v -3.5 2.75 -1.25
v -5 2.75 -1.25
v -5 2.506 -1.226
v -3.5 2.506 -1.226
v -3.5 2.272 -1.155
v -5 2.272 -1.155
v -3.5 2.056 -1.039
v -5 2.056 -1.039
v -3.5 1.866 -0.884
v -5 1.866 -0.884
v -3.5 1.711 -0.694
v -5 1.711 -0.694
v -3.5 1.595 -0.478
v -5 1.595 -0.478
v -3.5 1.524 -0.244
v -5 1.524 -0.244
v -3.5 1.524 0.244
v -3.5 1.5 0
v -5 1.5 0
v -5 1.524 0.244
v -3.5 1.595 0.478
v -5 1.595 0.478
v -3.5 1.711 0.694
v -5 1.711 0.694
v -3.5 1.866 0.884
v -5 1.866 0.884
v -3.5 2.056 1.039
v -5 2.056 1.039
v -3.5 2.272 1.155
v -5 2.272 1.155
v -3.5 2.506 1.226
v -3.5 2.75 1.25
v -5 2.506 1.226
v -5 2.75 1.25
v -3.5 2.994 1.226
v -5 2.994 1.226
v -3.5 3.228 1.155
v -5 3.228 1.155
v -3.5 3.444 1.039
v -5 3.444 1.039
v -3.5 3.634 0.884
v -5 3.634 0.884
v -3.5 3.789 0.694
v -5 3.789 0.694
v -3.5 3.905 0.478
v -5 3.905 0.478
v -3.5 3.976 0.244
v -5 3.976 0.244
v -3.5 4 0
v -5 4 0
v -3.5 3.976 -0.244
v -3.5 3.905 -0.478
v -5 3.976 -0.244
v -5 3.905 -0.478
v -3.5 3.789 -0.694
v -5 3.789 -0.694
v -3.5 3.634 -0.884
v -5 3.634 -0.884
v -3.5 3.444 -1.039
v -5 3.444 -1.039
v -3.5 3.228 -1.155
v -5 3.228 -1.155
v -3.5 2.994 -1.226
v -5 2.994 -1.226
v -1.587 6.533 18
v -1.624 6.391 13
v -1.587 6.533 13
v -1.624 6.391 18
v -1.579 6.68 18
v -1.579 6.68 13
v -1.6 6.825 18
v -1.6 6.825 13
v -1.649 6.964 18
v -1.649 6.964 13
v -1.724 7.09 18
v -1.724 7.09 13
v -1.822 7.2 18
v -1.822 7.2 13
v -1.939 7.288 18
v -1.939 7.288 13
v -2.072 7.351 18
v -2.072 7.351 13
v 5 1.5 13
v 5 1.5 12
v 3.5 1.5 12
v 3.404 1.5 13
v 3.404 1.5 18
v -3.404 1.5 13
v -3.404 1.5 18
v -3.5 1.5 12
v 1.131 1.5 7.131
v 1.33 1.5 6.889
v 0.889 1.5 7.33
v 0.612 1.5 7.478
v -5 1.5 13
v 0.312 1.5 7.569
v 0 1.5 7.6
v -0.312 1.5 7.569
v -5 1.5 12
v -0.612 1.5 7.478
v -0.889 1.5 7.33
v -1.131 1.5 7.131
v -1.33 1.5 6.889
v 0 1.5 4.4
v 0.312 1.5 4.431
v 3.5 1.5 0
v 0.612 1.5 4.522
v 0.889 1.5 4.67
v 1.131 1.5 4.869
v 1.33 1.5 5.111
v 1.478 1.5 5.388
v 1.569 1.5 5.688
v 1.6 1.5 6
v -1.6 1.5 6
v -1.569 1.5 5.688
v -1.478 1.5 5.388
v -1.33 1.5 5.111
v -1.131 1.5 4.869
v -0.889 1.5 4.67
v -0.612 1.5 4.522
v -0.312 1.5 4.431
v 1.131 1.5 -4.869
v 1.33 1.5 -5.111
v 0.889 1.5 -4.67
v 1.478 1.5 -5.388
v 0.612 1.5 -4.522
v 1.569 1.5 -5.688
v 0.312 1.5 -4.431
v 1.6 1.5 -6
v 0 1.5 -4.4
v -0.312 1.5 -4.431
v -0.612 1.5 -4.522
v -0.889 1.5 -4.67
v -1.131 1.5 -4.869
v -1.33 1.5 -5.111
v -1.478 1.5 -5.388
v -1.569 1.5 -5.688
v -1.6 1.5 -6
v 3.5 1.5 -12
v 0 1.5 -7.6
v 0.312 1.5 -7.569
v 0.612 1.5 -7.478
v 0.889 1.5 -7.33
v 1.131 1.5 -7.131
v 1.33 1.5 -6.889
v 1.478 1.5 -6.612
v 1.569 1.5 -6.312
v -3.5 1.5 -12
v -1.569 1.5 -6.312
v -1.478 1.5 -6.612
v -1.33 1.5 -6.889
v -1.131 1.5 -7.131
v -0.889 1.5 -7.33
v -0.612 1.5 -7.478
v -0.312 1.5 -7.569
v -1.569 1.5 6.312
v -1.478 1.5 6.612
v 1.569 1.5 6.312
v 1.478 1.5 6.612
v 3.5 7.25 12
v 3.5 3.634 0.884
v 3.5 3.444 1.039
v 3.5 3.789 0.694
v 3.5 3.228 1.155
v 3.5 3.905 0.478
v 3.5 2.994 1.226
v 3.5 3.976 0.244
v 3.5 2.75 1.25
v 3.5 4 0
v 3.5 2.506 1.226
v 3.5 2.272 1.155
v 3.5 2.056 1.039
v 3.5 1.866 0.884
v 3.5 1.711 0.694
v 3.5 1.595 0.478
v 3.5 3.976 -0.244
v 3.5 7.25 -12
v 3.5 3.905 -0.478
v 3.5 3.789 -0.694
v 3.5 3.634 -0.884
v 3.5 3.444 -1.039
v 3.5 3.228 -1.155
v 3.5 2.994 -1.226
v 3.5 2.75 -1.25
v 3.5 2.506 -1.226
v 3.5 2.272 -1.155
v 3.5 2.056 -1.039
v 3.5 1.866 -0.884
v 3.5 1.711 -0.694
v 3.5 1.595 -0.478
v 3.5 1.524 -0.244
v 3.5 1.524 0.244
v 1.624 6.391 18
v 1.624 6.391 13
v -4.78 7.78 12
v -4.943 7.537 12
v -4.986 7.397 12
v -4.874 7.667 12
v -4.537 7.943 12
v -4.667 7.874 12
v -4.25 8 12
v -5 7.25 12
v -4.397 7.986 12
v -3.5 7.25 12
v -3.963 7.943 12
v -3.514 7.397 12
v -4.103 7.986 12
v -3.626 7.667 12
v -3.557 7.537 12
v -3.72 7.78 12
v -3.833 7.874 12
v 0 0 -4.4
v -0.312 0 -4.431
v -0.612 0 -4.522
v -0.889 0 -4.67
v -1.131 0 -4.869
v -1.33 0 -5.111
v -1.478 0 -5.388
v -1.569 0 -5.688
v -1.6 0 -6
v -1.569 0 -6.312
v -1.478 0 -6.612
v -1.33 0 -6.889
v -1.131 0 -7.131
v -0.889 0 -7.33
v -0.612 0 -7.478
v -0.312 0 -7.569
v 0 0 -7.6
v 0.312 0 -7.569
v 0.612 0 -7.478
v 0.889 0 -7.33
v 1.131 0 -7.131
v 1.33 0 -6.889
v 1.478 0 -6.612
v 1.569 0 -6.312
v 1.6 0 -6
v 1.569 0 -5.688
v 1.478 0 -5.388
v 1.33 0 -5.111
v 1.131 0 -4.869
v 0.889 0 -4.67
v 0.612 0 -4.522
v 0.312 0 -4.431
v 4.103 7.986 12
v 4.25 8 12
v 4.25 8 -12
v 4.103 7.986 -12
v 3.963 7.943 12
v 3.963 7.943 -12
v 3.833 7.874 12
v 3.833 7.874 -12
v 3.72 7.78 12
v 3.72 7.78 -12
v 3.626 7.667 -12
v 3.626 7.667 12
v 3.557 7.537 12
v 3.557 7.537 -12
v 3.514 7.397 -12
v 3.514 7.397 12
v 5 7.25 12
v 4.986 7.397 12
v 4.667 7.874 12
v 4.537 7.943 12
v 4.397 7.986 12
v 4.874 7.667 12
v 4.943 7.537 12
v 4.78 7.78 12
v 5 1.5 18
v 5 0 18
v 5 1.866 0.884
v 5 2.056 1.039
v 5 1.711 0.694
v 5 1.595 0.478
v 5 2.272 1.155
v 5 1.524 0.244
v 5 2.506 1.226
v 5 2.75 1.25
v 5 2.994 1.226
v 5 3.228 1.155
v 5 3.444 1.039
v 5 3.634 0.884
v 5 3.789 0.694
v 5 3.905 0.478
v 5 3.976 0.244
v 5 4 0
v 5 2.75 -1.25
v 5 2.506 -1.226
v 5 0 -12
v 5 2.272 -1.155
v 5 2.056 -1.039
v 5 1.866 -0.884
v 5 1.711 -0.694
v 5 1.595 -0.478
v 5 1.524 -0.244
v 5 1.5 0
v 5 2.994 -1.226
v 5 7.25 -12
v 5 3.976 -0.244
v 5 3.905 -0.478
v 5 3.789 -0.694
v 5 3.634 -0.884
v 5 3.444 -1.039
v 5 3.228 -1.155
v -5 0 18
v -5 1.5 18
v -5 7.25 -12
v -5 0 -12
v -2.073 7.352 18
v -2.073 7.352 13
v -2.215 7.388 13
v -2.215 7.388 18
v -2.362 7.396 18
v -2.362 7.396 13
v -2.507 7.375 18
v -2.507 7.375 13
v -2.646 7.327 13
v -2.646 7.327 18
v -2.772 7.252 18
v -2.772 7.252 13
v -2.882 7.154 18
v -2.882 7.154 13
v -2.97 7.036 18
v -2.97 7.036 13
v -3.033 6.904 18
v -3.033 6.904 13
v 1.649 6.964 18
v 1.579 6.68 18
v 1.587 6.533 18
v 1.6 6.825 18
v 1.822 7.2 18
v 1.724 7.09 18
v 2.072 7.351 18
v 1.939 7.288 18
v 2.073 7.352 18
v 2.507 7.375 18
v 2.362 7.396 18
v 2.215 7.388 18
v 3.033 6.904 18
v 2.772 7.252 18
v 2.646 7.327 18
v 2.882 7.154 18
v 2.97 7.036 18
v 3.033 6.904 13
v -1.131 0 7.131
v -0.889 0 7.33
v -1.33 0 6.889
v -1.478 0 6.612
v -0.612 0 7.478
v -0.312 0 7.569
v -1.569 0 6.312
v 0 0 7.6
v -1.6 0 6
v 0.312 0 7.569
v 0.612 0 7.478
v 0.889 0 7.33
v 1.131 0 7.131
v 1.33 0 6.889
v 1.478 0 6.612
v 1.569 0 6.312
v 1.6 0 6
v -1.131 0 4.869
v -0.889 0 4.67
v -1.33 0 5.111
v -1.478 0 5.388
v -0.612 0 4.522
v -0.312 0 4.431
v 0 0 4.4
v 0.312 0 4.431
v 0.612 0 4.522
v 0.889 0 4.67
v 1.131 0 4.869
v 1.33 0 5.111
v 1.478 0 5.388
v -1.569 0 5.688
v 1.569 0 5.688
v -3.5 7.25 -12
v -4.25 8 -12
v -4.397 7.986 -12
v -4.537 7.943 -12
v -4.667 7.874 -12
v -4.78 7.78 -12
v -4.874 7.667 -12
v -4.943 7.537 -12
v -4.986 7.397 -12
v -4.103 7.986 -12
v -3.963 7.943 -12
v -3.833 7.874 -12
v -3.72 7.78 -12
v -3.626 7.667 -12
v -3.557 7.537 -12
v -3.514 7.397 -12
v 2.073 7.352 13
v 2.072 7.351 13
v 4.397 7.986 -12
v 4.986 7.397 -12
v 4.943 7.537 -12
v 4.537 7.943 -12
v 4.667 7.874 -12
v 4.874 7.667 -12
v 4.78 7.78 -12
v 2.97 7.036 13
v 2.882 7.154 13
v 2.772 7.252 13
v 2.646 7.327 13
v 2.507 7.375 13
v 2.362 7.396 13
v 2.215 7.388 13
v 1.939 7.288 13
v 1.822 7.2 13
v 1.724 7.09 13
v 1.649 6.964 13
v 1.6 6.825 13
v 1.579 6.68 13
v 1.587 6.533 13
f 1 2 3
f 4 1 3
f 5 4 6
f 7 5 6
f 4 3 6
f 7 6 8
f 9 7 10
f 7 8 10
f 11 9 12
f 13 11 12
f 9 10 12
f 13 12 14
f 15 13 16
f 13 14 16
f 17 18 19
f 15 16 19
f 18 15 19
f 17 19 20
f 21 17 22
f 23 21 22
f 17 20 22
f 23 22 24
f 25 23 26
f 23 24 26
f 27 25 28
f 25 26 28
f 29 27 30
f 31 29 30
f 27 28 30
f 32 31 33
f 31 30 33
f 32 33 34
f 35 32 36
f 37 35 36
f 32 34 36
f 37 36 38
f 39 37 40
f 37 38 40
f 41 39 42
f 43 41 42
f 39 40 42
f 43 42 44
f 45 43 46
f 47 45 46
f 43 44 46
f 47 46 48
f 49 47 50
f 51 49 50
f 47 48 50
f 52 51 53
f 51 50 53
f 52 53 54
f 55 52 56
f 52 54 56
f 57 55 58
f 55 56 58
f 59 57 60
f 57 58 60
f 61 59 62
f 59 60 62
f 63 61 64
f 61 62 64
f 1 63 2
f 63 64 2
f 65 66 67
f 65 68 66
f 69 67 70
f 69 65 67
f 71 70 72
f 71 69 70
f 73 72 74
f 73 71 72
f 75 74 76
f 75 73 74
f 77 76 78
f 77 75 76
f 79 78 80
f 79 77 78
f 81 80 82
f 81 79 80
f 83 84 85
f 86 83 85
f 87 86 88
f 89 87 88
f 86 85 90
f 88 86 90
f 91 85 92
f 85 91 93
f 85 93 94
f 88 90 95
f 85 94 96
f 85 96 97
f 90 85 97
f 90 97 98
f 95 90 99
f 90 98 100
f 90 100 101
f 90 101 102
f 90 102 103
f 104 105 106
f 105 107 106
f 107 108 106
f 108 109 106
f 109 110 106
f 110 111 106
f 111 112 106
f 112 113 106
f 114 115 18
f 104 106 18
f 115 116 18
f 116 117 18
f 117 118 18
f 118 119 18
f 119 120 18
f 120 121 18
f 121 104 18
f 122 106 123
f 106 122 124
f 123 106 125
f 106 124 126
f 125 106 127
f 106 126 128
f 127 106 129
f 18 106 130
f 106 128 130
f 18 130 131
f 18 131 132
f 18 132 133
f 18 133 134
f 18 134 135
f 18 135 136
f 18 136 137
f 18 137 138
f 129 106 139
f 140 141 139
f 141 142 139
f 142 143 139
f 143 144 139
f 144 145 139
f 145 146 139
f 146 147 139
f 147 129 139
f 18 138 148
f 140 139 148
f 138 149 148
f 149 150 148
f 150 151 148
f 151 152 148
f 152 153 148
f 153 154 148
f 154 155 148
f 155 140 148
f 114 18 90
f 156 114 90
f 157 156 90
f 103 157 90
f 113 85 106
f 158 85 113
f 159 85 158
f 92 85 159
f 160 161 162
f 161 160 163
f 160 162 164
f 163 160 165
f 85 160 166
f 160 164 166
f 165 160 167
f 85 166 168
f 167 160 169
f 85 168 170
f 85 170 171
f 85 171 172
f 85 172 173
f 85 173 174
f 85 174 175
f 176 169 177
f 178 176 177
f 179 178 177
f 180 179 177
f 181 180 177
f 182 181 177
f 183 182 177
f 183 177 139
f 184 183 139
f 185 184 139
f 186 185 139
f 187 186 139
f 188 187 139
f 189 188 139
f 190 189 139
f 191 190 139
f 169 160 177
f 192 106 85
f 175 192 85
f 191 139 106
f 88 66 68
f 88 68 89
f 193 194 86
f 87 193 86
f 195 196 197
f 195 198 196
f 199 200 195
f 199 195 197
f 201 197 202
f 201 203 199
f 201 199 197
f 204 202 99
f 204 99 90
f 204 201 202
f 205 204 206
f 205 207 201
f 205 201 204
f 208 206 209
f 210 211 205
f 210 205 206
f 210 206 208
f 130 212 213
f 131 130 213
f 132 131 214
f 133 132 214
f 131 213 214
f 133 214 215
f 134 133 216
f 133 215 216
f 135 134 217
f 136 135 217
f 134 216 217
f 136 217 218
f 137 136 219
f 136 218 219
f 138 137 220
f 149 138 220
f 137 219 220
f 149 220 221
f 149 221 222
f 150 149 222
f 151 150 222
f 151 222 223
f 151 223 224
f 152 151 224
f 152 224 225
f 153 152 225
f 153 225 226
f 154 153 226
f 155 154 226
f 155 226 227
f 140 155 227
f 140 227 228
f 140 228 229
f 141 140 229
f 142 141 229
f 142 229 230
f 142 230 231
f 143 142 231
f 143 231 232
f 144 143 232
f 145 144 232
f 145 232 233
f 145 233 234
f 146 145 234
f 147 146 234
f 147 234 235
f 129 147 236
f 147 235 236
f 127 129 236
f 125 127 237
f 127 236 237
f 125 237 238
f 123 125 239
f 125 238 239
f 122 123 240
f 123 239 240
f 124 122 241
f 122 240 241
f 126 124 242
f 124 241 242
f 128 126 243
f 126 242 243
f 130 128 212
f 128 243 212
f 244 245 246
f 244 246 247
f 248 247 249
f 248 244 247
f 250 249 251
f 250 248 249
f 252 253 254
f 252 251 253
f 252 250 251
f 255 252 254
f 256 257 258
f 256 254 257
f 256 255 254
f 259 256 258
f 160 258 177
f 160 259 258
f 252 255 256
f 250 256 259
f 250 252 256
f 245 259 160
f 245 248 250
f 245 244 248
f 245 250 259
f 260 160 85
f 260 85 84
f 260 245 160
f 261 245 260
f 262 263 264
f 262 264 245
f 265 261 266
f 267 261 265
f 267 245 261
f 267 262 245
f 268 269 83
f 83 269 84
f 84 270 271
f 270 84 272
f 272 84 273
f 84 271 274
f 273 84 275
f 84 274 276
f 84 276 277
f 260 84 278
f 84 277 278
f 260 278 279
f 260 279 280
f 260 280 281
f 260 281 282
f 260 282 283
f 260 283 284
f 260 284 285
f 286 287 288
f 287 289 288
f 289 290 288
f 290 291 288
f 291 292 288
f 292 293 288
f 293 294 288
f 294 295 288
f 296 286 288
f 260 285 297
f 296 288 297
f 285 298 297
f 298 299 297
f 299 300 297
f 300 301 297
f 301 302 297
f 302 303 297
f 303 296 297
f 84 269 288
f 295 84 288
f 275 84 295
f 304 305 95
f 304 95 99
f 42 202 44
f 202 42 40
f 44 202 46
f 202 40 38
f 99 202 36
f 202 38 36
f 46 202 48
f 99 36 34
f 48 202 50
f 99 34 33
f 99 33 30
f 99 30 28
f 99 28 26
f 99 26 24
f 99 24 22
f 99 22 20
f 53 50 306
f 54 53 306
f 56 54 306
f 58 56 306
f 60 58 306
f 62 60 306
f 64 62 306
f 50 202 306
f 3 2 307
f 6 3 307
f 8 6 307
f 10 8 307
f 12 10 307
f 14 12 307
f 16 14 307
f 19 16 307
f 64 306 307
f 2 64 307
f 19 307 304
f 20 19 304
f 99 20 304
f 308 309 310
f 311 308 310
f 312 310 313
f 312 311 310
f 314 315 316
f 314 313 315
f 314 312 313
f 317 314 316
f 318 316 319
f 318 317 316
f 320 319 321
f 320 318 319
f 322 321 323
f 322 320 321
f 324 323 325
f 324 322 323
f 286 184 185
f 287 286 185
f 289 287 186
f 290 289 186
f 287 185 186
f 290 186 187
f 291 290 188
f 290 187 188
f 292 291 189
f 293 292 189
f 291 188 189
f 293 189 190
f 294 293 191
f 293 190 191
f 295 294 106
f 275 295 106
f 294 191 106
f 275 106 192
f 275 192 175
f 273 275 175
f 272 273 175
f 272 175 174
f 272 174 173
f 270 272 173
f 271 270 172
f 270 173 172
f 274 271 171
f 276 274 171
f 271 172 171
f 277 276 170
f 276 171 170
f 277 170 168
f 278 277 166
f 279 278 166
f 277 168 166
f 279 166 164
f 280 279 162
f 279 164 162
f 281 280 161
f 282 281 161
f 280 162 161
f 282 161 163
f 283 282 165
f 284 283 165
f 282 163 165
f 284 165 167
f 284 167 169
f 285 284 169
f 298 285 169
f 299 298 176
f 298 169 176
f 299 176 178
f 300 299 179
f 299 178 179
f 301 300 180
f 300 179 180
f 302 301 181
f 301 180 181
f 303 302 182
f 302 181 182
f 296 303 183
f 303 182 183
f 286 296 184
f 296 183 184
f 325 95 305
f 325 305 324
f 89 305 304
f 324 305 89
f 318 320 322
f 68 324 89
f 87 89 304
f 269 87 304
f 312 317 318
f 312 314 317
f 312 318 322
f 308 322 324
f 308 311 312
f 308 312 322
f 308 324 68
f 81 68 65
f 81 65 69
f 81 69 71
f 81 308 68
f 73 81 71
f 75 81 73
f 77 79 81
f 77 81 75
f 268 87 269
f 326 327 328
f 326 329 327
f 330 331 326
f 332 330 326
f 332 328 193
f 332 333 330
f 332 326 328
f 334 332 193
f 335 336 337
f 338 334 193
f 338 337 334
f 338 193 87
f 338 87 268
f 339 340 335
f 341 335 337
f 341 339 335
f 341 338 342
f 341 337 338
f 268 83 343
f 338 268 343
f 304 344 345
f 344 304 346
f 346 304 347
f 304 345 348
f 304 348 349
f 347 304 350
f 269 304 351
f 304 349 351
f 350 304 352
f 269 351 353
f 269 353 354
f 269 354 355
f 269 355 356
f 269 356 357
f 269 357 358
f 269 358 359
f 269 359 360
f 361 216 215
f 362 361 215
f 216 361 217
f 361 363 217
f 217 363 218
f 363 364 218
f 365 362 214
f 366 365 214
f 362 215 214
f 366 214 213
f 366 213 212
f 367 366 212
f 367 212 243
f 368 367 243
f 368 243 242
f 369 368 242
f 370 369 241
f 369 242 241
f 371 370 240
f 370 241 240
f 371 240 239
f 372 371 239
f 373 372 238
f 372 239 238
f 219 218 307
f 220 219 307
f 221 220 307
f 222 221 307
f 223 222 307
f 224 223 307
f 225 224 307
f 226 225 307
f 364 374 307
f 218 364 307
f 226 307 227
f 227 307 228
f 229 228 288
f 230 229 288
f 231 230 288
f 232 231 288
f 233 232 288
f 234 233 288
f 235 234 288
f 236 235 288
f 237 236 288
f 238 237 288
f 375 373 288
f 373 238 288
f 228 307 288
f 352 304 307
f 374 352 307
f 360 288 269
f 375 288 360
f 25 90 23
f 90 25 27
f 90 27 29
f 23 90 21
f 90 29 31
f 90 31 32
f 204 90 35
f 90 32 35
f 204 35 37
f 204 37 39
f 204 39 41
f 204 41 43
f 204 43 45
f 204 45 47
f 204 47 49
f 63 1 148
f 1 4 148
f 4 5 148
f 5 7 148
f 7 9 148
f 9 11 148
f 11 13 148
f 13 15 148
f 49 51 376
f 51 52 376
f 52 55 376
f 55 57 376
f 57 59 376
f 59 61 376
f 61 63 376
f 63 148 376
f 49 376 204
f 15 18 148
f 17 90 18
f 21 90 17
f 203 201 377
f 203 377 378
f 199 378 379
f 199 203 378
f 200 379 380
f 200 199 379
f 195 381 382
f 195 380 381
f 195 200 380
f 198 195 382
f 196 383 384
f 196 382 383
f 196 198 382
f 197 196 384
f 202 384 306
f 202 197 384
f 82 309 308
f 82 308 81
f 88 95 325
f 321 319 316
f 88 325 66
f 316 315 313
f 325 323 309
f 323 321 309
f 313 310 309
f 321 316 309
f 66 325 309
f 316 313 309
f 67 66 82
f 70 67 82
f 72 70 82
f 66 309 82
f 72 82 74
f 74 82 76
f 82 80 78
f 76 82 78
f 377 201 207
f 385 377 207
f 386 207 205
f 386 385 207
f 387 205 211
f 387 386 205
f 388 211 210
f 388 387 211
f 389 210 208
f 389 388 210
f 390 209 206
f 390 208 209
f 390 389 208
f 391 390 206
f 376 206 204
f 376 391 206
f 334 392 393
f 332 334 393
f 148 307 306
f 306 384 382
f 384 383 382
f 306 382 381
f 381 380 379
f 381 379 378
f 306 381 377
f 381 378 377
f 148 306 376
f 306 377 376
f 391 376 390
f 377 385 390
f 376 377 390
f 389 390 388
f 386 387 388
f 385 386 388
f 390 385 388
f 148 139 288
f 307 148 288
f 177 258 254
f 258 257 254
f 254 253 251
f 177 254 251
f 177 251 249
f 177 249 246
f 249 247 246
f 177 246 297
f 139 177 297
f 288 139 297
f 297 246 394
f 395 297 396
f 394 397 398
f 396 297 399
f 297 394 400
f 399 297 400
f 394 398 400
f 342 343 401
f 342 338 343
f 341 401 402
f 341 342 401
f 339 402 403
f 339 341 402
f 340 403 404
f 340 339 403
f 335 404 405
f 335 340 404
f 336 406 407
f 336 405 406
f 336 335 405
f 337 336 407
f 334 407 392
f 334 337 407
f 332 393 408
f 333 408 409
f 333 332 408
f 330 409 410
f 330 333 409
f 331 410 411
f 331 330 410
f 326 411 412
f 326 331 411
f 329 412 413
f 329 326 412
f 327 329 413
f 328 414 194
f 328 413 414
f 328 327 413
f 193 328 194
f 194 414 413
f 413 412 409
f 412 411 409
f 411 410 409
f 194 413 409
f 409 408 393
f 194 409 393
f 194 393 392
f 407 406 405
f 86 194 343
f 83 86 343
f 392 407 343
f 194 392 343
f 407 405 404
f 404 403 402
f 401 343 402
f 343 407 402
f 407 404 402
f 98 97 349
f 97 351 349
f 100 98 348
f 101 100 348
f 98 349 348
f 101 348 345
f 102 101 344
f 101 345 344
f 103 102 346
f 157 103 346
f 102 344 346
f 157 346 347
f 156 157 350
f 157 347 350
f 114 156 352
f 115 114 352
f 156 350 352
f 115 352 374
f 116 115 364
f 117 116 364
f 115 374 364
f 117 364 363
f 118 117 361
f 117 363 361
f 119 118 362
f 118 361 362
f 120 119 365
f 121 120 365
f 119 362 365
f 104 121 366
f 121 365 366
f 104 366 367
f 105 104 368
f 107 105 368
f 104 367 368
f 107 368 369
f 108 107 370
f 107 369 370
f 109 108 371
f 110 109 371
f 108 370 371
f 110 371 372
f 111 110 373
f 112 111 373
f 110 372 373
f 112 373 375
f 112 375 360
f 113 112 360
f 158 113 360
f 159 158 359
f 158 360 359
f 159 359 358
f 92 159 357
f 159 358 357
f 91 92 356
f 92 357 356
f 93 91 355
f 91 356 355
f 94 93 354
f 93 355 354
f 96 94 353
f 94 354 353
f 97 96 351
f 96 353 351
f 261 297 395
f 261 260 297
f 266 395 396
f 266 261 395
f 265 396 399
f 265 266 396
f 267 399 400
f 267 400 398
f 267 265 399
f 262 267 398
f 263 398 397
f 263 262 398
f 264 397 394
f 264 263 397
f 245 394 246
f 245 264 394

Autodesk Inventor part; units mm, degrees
ref_plane "YZ Plane" through (0, 0, 0) normal (1, 0, 0) x (0, 1, 0)
ref_plane "XZ Plane" through (0, 0, 0) normal (0, 1, 0) x (-1, 0, 0)
ref_plane "XY Plane" through (0, 0, 0) normal (0, 0, 1) x (1, 0, 0)
sketch "Náčrt1" plane through (0, 0, 0) normal (0, 0, 1) x (1, 0, 0)
  line L0 (-5, 8) -> (-5, 0)
  line L1 (-5, 0) -> (5, 0)
  line L2 (5, 0) -> (5, 8)
  line L3 (5, 8) -> (3.5, 8)
  line L4 (3.5, 8) -> (3.5, 1.5)
  line L5 (3.5, 1.5) -> (-3.5, 1.5)
  line L6 (-3.5, 1.5) -> (-3.5, 8)
  line L7 (-3.5, 8) -> (-5, 8)
  line L8 (-7, 0) -> (7, 0) projected
  line L9 (0, 9.6) -> (0, -1.6) projected
  point P0 (0, 0)
  dimension "d0" = 10
  dimension "d1" = 8
  dimension "d2" = 1.5
  dimension "d3" = 1.5
  dimension "d4" = 1.5
extrude "Vysunutí1" add sketch "Náčrt1" along normal mid plane 24
sketch "Náčrt2" plane through (0, 0, 12) normal (0, 0, 1) x (1, 0, 0)
  line L0 (-5, 8) -> (-5, 0) projected
  line L1 (-5, 0) -> (5, 0) projected
  line L2 (5, 0) -> (5, 8) projected
  line L3 (5, 8) -> (3.5, 8) projected
  line L4 (3.5, 8) -> (3.5, 1.5) projected
  line L5 (3.5, 1.5) -> (-3.5, 1.5) projected
  line L6 (-3.5, 1.5) -> (-3.5, 8) projected
  line L7 (-3.5, 8) -> (-5, 8) projected
  line L8 (-5, 0) -> (5, 0)
  line L9 (5, 0) -> (5, 1.5)
  line L10 (5, 1.5) -> (-5, 1.5)
  line L11 (-5, 1.5) -> (-5, 0)
  line L12 (3.5, 1.5) -> (-3.5, 1.5) projected
  point P0 (0, 0)
extrude "Vysunutí2" add sketch "Náčrt2" along normal blind 1 contours L10 L5 L2 L1 L0
sketch "Náčrt3" plane through (0, 0, 13) normal (0, 0, 1) x (1, 0, 0)
  line L0 (-5, 1.5) -> (-5, 0) projected
  line L1 (-5, 0) -> (5, 0) projected
  line L2 (5, 0) -> (5, 1.5) projected
  line L3 (5, 1.5) -> (-5, 1.5) projected
  line L4 (-5, 1.5) -> (-5, 0)
  line L5 (5, 0) -> (-5, 0)
  line L6 (3.5, 1.5) -> (5, 1.5) projected
  line L7 (5, 1.5) -> (5, 0)
  line L8 (-5, 1.5) -> (-2.7769, 7.608)
  line L9 (-5, 1.5) -> (1.5, 1.5) construction
  line L10 (-2.7769, 7.608) -> (-1.3673, 7.095)
  line L11 (-1.3673, 7.095) -> (-3.4037, 1.5)
  line L12 (0, 9.6) -> (0, -1.6) projected
  line L13 (5, 1.5) -> (2.7769, 7.608)
  line L14 (2.7769, 7.608) -> (1.3673, 7.095)
  line L15 (1.3673, 7.095) -> (3.4037, 1.5)
  line L16 (-3.4037, 1.5) -> (3.4037, 1.5)
  line L17 (-3.4037, 1.5) -> (3.4037, 1.5)
  point P0 (0, 0)
  dimension "d9" = 6.5
  dimension "d10" = 70
  dimension "d11" = 1.5
extrude "Vysunutí3" add sketch "Náčrt3" along normal blind 5
fillet "Zaoblení1" radius 0.75 8 edges at (-3.5, 8, 0) (-5, 8, 0) (-2.7769, 7.608, 15.5) (-1.3673, 7.095, 15.5) (1.3673, 7.095, 15.5) (2.7769, 7.608, 15.5) (3.5, 8, 0) (5, 8, 0)
sketch "Náčrt4" plane through (5, 0, 18) normal (1, 0, 0) x (0, 0, -1)
  line L0 (6, 7.25) -> (30, 7.25) projected
  line L1 (6, 1.5) -> (6, 7.25) projected
  line L2 (6, 1.5) -> (5, 1.5) projected
  line L3 (5, 1.5) -> (0, 1.5) projected
  line L4 (0, 0) -> (0, 1.5) projected
  line L5 (30, 0) -> (0, 0) projected
  line L6 (30, 7.25) -> (30, 0) projected
  point P0 (18, 0)
  point P1 (18, 2.75)
  dimension "d15" = 12
  dimension "d16" = 2.75
hole "Díra1" at (5, 2.75, 0) direction (-1, 0, 0) diameter 2.5 end through all
sketch "Náčrt5" plane through (-3.5, 1.5, -12) normal (0, 1, 0) x (1, 0, 0)
  line L0 (7, 0) -> (7, -12) projected
  line L1 (0, 0) -> (7, 0) projected
  line L2 (0, 0) -> (0, -12) projected
  line L3 (0, -12) -> (0, -24) projected
  line L4 (-1.5, -24) -> (0, -24) projected
  line L5 (-1.5, -24) -> (-1.5, -25) projected
  line L6 (0.0963, -25) -> (-1.5, -25) projected
  line L7 (0.0963, -25) -> (0.0963, -30) projected
  line L8 (6.9037, -30) -> (0.0963, -30) projected
  line L9 (6.9037, -25) -> (6.9037, -30) projected
  line L10 (8.5, -25) -> (6.9037, -25) projected
  line L11 (8.5, -24) -> (8.5, -25) projected
  line L12 (7, -24) -> (8.5, -24) projected
  line L13 (7, -12) -> (7, -24) projected
  line L14 (-1.5, 0) -> (-1.5, -24) projected
  point P0 (3.5, -12)
  point P1 (3.5, -6)
  point P2 (3.5, -18)
  dimension "d24" = 5
  dimension "d25" = 6
  dimension "d26" = 12
hole "Díra2" at (0, 1.5, -6) at (0, 1.5, 6) direction (0, -1, 0) diameter 3.2 end through all
properties part number "y_holder" material "Hliník 6061"
